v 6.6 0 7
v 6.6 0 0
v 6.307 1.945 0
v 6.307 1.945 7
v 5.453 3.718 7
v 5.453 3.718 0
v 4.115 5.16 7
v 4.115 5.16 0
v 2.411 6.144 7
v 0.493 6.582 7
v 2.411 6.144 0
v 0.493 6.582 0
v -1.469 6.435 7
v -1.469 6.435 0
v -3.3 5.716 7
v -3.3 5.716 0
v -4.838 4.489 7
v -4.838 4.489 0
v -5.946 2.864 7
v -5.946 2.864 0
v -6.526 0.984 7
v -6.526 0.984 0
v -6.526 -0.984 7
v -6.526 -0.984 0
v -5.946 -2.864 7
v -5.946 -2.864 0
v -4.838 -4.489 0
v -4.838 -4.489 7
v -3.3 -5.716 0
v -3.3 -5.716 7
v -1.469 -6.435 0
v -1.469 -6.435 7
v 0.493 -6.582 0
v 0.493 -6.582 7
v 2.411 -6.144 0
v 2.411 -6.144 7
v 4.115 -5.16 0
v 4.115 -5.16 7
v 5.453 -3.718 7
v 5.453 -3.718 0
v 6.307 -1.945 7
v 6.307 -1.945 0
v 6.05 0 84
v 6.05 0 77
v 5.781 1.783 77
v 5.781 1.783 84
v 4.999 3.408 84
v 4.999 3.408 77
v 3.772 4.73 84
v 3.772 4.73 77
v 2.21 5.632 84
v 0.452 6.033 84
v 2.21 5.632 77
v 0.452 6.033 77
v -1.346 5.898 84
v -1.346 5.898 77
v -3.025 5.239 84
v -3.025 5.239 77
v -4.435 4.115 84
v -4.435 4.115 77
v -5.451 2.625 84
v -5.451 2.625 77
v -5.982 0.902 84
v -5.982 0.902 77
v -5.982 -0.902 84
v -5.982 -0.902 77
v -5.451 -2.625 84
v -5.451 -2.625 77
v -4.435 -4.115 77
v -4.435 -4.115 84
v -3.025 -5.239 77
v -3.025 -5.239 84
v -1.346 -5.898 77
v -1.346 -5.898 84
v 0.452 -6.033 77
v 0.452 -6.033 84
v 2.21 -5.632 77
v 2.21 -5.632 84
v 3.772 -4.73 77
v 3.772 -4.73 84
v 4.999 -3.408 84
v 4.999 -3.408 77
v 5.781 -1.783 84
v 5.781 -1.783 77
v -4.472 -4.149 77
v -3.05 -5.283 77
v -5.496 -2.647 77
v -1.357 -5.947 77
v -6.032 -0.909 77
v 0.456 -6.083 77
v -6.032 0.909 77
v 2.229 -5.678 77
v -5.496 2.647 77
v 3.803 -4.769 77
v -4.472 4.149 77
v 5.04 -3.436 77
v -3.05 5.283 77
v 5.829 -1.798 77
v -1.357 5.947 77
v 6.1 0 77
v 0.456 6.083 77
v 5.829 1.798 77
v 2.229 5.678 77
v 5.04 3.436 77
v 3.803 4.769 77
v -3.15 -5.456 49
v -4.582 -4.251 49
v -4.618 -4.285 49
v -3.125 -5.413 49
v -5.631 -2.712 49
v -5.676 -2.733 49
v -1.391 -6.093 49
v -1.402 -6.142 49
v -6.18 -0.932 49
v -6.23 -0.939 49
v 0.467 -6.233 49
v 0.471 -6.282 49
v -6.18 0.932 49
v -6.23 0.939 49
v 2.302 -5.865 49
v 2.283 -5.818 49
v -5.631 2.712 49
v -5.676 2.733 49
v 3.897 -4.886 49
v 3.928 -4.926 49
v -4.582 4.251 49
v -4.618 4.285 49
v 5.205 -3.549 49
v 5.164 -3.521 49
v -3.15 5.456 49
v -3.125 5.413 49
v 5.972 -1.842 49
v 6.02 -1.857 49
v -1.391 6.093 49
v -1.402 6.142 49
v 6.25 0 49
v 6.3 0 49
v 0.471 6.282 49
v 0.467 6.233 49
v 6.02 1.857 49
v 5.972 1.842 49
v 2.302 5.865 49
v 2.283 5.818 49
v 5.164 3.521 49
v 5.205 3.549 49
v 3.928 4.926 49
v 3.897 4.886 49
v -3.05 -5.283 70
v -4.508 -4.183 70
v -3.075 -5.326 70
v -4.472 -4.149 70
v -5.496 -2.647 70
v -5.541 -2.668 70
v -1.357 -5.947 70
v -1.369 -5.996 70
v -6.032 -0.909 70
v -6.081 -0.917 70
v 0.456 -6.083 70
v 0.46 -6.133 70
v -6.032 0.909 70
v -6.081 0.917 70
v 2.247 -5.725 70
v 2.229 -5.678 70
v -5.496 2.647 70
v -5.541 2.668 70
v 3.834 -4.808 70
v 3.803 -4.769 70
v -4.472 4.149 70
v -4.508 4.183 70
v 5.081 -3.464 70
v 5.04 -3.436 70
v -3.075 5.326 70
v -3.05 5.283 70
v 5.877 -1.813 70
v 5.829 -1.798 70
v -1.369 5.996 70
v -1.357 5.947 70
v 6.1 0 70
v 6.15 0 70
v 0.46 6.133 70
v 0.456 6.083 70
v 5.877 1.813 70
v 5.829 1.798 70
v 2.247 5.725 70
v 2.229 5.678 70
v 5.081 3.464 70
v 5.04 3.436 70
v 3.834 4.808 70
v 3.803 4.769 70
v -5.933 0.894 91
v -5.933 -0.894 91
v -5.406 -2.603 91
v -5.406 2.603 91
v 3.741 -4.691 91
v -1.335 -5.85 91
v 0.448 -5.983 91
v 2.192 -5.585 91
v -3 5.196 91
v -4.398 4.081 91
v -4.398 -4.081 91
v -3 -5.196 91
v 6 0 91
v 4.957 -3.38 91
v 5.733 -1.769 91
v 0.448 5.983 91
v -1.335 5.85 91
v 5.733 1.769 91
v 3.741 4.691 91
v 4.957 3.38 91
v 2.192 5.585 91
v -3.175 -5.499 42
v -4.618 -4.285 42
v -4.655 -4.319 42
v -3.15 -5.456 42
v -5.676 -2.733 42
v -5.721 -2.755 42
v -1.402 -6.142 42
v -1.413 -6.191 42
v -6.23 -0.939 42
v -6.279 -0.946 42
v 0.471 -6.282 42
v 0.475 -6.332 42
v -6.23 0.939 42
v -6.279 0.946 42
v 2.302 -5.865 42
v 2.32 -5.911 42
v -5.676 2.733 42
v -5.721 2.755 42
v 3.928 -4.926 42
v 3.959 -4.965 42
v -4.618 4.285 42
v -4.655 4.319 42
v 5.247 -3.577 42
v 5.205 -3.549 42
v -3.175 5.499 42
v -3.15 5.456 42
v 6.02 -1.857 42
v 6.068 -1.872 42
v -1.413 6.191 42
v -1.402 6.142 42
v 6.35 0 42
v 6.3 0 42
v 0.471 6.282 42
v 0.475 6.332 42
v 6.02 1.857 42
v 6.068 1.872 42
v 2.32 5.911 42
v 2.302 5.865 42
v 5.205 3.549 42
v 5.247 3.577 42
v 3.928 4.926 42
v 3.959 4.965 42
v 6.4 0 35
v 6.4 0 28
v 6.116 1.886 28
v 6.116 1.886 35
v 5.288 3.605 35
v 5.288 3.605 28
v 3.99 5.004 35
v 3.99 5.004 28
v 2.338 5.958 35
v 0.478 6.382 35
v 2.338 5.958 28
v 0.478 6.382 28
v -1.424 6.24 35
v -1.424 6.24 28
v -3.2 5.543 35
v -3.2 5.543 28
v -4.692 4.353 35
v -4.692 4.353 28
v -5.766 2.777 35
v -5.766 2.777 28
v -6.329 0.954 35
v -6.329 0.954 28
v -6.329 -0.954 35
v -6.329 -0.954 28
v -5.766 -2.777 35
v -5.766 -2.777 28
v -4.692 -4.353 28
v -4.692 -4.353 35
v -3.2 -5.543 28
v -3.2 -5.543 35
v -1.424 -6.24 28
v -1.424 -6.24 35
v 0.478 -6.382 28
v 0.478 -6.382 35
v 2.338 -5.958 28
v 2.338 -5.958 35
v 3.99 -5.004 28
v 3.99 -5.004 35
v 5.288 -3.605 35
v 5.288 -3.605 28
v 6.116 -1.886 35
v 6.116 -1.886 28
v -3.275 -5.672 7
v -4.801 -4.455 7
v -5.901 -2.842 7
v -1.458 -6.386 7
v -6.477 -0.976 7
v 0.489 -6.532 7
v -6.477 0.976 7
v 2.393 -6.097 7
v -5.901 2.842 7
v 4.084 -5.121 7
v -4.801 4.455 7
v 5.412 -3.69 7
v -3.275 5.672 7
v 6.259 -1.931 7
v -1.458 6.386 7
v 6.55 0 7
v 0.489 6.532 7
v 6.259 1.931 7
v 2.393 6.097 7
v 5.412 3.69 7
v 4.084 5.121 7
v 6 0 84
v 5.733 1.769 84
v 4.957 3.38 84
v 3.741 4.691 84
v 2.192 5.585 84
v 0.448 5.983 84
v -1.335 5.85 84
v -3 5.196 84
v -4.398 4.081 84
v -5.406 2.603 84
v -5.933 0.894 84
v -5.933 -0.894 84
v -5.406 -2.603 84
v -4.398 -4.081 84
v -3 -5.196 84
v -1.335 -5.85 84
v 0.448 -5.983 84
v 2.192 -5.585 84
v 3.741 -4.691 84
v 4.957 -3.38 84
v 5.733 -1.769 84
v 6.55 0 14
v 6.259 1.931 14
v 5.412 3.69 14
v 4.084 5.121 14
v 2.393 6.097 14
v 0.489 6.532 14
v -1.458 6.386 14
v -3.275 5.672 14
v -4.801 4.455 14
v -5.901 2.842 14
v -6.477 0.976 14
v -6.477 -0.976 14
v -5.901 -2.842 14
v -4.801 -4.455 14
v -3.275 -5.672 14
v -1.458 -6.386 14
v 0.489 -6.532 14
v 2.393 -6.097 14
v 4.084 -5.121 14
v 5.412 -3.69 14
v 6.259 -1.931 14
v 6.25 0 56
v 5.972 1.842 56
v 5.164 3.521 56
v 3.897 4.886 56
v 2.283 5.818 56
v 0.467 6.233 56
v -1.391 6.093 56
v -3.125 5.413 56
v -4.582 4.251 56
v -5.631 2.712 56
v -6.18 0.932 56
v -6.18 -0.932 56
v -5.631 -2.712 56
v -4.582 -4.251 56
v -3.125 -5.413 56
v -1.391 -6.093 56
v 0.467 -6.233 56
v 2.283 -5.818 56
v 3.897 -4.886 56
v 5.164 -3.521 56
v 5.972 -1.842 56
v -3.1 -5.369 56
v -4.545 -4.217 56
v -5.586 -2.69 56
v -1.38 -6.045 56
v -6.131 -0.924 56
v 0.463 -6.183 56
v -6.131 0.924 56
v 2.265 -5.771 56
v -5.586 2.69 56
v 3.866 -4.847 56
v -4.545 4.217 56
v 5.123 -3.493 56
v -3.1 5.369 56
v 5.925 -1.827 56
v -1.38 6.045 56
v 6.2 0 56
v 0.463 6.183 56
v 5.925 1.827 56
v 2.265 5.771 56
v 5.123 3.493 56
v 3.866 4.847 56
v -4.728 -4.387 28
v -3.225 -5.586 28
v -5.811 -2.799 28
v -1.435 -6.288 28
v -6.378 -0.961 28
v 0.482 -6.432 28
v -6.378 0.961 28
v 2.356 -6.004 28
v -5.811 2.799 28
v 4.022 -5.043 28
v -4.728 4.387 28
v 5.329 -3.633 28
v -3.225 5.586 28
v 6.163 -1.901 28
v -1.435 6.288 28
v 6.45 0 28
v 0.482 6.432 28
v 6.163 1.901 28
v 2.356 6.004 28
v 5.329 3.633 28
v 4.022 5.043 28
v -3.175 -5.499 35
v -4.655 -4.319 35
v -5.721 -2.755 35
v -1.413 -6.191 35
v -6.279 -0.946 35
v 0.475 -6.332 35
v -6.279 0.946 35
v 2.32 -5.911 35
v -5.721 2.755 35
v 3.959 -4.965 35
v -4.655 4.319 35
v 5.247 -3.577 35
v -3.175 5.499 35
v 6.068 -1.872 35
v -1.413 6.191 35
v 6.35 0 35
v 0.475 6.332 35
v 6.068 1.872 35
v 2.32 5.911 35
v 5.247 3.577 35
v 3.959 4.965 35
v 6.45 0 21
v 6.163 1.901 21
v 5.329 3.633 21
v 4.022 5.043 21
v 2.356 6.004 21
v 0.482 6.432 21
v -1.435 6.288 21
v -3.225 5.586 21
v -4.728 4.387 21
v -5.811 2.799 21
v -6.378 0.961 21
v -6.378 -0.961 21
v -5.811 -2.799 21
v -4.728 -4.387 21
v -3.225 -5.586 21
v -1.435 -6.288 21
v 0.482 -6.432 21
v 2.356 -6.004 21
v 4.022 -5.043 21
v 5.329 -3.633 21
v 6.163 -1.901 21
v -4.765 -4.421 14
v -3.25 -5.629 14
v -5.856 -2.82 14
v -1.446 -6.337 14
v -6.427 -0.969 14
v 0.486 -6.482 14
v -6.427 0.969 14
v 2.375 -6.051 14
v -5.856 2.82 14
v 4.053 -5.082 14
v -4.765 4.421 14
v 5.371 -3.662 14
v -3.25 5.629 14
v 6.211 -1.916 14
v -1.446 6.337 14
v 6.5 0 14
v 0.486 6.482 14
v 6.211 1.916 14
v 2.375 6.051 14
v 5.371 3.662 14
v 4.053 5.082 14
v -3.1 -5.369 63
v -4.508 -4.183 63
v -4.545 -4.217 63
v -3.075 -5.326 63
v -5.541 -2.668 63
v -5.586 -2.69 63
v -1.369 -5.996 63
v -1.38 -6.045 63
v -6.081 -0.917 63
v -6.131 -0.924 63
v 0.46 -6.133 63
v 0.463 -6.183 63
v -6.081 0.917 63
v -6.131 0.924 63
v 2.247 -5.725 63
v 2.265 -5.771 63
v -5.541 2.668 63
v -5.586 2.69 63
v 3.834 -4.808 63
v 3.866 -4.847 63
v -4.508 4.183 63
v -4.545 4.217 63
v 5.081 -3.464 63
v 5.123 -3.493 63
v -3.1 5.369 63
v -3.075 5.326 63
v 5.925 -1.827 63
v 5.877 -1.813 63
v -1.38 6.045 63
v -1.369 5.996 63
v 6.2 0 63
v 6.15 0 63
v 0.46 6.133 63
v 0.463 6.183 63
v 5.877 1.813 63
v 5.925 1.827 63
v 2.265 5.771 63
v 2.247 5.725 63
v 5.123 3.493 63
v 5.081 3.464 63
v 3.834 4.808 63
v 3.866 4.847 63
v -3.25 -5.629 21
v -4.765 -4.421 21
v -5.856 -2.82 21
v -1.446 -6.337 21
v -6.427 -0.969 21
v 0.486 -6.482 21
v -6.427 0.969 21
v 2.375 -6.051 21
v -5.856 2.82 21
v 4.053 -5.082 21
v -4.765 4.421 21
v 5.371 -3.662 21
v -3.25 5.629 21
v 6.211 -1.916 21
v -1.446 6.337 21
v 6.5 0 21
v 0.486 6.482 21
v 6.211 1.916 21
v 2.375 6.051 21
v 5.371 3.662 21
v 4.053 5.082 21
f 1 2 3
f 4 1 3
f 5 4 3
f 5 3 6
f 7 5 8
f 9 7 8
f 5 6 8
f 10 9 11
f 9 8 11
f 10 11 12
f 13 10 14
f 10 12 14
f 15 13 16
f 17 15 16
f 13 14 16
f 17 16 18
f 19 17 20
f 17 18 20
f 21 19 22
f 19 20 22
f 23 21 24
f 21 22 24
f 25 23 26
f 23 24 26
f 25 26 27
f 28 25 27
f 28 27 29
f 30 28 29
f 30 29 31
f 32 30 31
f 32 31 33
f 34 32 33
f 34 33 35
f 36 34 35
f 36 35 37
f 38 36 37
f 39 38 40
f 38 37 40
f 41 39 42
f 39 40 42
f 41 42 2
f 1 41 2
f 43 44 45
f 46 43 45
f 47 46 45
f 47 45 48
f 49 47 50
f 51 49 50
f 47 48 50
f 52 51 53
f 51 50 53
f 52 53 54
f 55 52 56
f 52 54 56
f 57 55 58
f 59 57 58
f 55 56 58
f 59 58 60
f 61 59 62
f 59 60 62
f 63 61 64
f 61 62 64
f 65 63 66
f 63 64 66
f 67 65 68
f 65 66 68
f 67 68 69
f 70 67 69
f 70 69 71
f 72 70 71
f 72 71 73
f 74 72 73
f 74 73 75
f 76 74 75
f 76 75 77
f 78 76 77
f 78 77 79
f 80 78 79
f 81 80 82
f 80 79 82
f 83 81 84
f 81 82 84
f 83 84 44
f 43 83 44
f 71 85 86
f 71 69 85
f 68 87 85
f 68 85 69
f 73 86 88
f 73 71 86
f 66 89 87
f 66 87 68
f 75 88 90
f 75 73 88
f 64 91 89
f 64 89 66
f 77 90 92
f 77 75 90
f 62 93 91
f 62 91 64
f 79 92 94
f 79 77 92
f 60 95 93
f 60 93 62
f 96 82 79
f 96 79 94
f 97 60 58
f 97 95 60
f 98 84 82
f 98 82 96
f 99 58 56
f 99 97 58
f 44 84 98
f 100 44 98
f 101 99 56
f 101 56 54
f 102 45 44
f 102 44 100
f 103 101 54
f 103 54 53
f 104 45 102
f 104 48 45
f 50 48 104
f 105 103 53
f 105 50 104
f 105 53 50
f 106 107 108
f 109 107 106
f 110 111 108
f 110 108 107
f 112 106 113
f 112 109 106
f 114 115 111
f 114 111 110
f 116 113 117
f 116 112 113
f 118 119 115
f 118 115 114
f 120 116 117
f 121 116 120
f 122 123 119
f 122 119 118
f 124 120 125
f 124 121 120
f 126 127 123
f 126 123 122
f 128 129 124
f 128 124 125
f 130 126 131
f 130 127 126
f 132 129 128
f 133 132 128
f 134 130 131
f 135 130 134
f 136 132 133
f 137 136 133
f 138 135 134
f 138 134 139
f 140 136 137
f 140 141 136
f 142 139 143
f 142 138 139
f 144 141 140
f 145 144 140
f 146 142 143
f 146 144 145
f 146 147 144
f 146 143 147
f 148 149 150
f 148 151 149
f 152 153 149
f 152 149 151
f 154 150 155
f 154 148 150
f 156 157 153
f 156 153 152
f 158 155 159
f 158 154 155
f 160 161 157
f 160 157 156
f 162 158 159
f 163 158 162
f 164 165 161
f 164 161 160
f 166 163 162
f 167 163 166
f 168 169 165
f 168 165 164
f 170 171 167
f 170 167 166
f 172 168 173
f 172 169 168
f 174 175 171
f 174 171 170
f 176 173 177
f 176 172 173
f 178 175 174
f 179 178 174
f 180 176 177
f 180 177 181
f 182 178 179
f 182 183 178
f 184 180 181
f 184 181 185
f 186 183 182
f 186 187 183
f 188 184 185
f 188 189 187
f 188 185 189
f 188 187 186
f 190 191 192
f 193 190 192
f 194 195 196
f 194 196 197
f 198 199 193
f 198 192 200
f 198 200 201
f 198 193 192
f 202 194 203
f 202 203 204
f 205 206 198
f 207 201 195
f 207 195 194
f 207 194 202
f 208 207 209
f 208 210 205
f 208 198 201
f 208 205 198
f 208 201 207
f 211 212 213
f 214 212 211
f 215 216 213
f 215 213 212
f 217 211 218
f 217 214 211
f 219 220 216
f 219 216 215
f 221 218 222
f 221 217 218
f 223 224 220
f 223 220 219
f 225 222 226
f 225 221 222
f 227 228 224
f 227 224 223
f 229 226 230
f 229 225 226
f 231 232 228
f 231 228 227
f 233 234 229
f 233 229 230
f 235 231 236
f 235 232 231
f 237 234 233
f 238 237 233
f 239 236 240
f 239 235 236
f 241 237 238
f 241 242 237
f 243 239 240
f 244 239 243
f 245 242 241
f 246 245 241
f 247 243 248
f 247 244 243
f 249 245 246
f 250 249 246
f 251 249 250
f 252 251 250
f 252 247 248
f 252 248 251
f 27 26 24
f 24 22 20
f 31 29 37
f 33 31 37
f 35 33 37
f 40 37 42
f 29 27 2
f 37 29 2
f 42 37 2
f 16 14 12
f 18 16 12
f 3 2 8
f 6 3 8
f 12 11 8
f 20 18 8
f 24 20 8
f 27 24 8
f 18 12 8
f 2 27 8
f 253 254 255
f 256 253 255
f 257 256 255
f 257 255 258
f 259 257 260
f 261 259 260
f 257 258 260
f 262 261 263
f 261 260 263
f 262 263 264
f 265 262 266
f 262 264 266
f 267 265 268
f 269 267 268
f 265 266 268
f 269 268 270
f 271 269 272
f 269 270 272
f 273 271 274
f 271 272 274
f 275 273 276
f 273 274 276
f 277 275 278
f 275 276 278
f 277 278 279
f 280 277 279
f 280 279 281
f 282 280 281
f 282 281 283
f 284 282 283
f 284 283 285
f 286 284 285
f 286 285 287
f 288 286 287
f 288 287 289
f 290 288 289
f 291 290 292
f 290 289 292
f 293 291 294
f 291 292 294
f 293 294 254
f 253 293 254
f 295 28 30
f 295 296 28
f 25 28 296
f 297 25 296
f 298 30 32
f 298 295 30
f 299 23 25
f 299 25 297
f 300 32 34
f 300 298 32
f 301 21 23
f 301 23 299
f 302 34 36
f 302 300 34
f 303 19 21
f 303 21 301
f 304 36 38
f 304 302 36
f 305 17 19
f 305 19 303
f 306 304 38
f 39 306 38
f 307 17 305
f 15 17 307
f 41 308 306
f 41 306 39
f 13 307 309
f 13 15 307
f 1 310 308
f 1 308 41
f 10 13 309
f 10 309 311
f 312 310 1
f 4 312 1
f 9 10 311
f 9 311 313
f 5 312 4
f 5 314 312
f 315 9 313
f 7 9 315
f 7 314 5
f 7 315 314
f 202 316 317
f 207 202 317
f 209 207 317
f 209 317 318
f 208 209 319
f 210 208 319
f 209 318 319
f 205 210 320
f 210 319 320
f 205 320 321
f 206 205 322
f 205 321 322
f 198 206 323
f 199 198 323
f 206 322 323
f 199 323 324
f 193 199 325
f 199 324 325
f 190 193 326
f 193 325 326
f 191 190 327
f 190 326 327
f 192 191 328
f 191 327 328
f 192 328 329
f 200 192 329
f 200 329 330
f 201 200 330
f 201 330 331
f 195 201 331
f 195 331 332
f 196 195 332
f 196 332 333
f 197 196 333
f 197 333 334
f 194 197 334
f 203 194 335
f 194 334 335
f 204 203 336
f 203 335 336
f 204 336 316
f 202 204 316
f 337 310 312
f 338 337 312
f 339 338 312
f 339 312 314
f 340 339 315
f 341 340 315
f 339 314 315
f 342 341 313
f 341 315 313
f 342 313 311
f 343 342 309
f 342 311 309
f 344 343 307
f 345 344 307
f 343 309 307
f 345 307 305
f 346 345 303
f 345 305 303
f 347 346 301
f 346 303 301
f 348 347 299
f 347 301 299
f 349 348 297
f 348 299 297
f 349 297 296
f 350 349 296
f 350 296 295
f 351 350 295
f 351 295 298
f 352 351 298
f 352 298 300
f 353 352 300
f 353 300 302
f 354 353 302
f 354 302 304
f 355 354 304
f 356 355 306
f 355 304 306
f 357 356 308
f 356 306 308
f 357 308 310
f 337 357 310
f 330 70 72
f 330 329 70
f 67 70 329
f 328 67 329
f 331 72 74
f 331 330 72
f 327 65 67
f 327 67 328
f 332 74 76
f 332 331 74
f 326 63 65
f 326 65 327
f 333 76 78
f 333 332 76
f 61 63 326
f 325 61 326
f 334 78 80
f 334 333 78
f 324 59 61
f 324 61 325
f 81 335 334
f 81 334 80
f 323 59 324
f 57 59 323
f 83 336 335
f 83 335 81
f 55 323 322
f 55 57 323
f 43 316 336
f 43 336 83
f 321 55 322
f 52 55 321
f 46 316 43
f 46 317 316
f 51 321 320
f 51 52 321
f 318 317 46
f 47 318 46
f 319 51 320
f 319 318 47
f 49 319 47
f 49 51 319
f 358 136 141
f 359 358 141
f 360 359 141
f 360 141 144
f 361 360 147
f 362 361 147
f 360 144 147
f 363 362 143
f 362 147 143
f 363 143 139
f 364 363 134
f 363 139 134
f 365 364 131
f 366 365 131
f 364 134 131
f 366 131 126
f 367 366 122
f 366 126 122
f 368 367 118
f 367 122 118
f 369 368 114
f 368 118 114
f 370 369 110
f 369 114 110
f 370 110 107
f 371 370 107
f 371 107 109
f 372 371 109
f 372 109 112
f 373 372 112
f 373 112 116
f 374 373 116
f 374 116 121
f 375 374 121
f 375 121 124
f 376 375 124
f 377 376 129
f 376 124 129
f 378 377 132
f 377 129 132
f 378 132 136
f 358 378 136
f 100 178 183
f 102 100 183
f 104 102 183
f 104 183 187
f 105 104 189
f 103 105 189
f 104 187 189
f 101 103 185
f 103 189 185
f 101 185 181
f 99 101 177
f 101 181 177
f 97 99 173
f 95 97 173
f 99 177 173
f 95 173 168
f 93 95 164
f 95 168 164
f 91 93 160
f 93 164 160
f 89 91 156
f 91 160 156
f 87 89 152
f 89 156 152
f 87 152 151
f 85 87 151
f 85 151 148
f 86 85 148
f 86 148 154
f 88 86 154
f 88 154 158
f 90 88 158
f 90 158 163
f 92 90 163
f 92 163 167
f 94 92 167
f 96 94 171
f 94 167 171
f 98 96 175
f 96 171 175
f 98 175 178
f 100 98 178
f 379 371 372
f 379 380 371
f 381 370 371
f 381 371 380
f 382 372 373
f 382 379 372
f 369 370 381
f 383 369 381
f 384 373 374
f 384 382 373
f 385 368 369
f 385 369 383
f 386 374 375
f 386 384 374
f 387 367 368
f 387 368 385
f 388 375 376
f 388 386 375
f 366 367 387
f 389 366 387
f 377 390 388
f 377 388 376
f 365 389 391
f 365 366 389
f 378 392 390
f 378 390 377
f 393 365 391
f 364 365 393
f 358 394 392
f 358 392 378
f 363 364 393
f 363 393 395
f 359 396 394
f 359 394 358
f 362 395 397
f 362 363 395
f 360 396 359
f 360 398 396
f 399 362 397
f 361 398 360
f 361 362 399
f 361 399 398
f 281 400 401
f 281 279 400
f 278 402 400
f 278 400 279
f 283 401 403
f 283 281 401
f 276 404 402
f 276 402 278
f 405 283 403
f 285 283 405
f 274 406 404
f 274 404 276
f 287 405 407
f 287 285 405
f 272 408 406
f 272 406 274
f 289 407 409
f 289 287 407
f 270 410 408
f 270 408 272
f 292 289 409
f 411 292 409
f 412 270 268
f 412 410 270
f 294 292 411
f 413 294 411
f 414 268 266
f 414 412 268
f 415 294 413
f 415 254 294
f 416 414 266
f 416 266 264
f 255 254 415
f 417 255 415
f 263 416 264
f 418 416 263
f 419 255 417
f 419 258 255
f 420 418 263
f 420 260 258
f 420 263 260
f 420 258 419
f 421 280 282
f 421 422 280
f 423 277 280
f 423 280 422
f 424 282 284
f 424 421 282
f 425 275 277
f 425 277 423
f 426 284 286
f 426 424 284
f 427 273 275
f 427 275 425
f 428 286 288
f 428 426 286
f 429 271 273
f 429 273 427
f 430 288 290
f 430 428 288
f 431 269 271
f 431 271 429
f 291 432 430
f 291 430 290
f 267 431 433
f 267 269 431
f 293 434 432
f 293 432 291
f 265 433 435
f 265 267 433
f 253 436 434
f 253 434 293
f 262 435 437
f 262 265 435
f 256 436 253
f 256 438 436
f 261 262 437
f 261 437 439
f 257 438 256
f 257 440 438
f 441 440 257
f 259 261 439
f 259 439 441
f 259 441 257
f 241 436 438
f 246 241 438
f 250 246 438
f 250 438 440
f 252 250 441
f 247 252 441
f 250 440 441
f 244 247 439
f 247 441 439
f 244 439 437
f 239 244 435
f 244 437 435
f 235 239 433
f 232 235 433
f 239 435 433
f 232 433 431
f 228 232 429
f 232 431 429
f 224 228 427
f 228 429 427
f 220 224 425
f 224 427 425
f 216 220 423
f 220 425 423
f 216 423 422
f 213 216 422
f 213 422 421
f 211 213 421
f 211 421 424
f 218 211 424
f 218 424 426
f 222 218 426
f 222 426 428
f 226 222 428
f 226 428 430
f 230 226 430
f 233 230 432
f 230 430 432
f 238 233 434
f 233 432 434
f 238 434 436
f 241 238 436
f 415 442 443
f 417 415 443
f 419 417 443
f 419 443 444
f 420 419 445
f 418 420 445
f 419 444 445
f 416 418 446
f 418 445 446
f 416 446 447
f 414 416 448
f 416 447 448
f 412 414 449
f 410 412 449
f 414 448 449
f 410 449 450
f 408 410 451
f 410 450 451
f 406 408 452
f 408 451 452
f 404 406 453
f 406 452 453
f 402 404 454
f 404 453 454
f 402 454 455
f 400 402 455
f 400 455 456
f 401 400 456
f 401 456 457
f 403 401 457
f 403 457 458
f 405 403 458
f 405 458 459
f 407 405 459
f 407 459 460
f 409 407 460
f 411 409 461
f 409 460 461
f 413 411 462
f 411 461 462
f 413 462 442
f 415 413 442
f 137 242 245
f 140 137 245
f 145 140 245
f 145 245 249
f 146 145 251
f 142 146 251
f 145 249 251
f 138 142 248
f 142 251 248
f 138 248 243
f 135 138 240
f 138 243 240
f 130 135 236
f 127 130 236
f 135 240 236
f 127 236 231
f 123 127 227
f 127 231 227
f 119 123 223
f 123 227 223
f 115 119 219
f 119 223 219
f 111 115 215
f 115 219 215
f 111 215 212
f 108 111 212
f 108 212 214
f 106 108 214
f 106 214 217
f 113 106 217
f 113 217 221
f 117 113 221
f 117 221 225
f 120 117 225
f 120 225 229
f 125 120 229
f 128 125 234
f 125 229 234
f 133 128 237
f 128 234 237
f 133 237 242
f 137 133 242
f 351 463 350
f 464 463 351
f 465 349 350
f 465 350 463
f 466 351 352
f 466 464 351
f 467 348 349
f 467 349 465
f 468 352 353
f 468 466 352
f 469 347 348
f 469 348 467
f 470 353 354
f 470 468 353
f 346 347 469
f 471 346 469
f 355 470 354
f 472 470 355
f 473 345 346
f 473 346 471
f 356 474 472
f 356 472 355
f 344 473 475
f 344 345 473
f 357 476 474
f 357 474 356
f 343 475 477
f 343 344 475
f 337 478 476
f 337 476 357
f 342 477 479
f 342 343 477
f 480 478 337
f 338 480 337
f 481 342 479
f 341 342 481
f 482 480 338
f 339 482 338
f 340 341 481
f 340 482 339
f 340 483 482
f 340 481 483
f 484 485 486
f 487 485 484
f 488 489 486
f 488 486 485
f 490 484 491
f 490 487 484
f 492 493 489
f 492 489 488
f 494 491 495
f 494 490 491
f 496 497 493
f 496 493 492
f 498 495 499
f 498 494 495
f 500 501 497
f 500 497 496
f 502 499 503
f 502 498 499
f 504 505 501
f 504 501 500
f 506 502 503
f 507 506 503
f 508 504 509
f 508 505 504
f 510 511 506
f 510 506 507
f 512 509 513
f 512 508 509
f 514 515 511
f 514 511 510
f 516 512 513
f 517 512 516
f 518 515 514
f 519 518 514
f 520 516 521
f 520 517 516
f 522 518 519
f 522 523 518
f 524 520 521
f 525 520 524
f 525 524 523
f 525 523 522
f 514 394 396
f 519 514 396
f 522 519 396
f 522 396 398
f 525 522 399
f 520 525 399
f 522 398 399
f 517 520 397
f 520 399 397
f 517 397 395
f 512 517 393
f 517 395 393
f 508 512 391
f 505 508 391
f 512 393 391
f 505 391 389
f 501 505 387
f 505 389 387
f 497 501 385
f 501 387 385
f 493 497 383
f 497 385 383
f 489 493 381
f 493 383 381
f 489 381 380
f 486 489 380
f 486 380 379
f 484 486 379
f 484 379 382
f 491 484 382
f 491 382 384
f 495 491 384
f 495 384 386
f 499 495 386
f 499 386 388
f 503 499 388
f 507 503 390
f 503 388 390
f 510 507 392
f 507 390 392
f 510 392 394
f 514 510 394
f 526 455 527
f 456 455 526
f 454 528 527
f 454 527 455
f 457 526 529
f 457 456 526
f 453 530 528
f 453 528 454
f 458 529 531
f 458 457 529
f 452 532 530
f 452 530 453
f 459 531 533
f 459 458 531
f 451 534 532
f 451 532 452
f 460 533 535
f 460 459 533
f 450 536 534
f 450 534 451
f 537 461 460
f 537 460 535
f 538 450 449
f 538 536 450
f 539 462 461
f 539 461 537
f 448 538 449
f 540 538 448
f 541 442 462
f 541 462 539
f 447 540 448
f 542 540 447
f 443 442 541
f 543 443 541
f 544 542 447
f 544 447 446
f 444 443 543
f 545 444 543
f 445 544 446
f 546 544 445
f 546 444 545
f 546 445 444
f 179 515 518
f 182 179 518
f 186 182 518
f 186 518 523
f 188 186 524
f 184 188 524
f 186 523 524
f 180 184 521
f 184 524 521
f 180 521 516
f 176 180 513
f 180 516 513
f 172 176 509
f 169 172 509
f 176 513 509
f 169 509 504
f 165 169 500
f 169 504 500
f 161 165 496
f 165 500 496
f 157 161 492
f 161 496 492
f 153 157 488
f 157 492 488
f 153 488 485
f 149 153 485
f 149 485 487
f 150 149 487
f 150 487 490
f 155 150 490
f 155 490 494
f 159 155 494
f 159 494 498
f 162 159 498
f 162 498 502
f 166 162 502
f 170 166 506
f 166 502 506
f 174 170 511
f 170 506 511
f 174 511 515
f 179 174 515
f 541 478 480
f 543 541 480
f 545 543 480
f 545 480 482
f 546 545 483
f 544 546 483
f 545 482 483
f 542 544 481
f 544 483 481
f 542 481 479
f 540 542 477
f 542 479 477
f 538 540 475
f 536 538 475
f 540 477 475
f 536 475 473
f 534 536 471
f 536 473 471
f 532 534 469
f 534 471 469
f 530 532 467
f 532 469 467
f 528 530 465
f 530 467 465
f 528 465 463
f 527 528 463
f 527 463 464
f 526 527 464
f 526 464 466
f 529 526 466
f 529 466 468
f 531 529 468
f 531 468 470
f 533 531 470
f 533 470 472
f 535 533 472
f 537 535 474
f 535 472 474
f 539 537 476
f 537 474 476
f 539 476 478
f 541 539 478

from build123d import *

# Parameters (mm, degrees)
F0_R      = 6.6
F1_DEPTH  = 7
F2_R      = 6.55
F3_DEPTH  = 7
F4_R      = 6.5
F5_DEPTH  = 7
F6_R      = 6.45
F7_DEPTH  = 7
F8_R      = 6.4
F9_DEPTH  = 7
F10_R     = 6.35
F11_DEPTH = 7
F12_R     = 6.3
F13_DEPTH = 7
F14_R     = 6.25
F15_DEPTH = 7
F16_R     = 6.2
F17_DEPTH = 7
F18_R     = 6.15
F19_DEPTH = 7
F20_R     = 6.1
F21_DEPTH = 7
F22_R     = 6.05
F23_DEPTH = 7
F24_R     = 6
F25_DEPTH = 7


# Not quite as in the source:
# - a feature of the source that left no trace in its solid (it failed there, or was rolled back) is left out


with BuildPart() as f1:
    # F0 (on Top) → F1 (new body)
    with BuildSketch(Plane.XY):
        Circle(F0_R)
    extrude(amount=F1_DEPTH)

    # F2 (on face) → F3 (join)
    with BuildSketch(Plane.XY.offset(7)):
        Circle(F2_R)
    extrude(amount=F3_DEPTH)

    # F4 (on face) → F5 (join)
    with BuildSketch(Plane.XY.offset(14)):
        Circle(F4_R)
    extrude(amount=F5_DEPTH)

    # F6 (on face) → F7 (join)
    with BuildSketch(Plane.XY.offset(21)):
        Circle(F6_R)
    extrude(amount=F7_DEPTH)

    # F8 (on face) → F9 (join)
    with BuildSketch(Plane.XY.offset(28)):
        Circle(F8_R)
    extrude(amount=F9_DEPTH)

    # F10 (on face) → F11 (join)
    with BuildSketch(Plane.XY.offset(35)):
        Circle(F10_R)
    extrude(amount=F11_DEPTH)

    # F12 (on face) → F13 (join)
    with BuildSketch(Plane.XY.offset(42)):
        Circle(F12_R)
    extrude(amount=F13_DEPTH)

    # F14 (on face) → F15 (join)
    with BuildSketch(Plane.XY.offset(49)):
        Circle(F14_R)
    extrude(amount=F15_DEPTH)

    # F16 (on face) → F17 (join)
    with BuildSketch(Plane.XY.offset(56)):
        Circle(F16_R)
    extrude(amount=F17_DEPTH)

    # F18 (on face) → F19 (join)
    with BuildSketch(Plane.XY.offset(63)):
        Circle(F18_R)
    extrude(amount=F19_DEPTH)

    # F20 (on face) → F21 (join)
    with BuildSketch(Plane.XY.offset(70)):
        Circle(F20_R)
    extrude(amount=F21_DEPTH)

    # F22 (on face) → F23 (join)
    with BuildSketch(Plane.XY.offset(77)):
        Circle(F22_R)
    extrude(amount=F23_DEPTH)

    # F24 (on face) → F25 (join)
    with BuildSketch(Plane.XY.offset(84)):
        Circle(F24_R)
    extrude(amount=F25_DEPTH)


solid = f1.part
